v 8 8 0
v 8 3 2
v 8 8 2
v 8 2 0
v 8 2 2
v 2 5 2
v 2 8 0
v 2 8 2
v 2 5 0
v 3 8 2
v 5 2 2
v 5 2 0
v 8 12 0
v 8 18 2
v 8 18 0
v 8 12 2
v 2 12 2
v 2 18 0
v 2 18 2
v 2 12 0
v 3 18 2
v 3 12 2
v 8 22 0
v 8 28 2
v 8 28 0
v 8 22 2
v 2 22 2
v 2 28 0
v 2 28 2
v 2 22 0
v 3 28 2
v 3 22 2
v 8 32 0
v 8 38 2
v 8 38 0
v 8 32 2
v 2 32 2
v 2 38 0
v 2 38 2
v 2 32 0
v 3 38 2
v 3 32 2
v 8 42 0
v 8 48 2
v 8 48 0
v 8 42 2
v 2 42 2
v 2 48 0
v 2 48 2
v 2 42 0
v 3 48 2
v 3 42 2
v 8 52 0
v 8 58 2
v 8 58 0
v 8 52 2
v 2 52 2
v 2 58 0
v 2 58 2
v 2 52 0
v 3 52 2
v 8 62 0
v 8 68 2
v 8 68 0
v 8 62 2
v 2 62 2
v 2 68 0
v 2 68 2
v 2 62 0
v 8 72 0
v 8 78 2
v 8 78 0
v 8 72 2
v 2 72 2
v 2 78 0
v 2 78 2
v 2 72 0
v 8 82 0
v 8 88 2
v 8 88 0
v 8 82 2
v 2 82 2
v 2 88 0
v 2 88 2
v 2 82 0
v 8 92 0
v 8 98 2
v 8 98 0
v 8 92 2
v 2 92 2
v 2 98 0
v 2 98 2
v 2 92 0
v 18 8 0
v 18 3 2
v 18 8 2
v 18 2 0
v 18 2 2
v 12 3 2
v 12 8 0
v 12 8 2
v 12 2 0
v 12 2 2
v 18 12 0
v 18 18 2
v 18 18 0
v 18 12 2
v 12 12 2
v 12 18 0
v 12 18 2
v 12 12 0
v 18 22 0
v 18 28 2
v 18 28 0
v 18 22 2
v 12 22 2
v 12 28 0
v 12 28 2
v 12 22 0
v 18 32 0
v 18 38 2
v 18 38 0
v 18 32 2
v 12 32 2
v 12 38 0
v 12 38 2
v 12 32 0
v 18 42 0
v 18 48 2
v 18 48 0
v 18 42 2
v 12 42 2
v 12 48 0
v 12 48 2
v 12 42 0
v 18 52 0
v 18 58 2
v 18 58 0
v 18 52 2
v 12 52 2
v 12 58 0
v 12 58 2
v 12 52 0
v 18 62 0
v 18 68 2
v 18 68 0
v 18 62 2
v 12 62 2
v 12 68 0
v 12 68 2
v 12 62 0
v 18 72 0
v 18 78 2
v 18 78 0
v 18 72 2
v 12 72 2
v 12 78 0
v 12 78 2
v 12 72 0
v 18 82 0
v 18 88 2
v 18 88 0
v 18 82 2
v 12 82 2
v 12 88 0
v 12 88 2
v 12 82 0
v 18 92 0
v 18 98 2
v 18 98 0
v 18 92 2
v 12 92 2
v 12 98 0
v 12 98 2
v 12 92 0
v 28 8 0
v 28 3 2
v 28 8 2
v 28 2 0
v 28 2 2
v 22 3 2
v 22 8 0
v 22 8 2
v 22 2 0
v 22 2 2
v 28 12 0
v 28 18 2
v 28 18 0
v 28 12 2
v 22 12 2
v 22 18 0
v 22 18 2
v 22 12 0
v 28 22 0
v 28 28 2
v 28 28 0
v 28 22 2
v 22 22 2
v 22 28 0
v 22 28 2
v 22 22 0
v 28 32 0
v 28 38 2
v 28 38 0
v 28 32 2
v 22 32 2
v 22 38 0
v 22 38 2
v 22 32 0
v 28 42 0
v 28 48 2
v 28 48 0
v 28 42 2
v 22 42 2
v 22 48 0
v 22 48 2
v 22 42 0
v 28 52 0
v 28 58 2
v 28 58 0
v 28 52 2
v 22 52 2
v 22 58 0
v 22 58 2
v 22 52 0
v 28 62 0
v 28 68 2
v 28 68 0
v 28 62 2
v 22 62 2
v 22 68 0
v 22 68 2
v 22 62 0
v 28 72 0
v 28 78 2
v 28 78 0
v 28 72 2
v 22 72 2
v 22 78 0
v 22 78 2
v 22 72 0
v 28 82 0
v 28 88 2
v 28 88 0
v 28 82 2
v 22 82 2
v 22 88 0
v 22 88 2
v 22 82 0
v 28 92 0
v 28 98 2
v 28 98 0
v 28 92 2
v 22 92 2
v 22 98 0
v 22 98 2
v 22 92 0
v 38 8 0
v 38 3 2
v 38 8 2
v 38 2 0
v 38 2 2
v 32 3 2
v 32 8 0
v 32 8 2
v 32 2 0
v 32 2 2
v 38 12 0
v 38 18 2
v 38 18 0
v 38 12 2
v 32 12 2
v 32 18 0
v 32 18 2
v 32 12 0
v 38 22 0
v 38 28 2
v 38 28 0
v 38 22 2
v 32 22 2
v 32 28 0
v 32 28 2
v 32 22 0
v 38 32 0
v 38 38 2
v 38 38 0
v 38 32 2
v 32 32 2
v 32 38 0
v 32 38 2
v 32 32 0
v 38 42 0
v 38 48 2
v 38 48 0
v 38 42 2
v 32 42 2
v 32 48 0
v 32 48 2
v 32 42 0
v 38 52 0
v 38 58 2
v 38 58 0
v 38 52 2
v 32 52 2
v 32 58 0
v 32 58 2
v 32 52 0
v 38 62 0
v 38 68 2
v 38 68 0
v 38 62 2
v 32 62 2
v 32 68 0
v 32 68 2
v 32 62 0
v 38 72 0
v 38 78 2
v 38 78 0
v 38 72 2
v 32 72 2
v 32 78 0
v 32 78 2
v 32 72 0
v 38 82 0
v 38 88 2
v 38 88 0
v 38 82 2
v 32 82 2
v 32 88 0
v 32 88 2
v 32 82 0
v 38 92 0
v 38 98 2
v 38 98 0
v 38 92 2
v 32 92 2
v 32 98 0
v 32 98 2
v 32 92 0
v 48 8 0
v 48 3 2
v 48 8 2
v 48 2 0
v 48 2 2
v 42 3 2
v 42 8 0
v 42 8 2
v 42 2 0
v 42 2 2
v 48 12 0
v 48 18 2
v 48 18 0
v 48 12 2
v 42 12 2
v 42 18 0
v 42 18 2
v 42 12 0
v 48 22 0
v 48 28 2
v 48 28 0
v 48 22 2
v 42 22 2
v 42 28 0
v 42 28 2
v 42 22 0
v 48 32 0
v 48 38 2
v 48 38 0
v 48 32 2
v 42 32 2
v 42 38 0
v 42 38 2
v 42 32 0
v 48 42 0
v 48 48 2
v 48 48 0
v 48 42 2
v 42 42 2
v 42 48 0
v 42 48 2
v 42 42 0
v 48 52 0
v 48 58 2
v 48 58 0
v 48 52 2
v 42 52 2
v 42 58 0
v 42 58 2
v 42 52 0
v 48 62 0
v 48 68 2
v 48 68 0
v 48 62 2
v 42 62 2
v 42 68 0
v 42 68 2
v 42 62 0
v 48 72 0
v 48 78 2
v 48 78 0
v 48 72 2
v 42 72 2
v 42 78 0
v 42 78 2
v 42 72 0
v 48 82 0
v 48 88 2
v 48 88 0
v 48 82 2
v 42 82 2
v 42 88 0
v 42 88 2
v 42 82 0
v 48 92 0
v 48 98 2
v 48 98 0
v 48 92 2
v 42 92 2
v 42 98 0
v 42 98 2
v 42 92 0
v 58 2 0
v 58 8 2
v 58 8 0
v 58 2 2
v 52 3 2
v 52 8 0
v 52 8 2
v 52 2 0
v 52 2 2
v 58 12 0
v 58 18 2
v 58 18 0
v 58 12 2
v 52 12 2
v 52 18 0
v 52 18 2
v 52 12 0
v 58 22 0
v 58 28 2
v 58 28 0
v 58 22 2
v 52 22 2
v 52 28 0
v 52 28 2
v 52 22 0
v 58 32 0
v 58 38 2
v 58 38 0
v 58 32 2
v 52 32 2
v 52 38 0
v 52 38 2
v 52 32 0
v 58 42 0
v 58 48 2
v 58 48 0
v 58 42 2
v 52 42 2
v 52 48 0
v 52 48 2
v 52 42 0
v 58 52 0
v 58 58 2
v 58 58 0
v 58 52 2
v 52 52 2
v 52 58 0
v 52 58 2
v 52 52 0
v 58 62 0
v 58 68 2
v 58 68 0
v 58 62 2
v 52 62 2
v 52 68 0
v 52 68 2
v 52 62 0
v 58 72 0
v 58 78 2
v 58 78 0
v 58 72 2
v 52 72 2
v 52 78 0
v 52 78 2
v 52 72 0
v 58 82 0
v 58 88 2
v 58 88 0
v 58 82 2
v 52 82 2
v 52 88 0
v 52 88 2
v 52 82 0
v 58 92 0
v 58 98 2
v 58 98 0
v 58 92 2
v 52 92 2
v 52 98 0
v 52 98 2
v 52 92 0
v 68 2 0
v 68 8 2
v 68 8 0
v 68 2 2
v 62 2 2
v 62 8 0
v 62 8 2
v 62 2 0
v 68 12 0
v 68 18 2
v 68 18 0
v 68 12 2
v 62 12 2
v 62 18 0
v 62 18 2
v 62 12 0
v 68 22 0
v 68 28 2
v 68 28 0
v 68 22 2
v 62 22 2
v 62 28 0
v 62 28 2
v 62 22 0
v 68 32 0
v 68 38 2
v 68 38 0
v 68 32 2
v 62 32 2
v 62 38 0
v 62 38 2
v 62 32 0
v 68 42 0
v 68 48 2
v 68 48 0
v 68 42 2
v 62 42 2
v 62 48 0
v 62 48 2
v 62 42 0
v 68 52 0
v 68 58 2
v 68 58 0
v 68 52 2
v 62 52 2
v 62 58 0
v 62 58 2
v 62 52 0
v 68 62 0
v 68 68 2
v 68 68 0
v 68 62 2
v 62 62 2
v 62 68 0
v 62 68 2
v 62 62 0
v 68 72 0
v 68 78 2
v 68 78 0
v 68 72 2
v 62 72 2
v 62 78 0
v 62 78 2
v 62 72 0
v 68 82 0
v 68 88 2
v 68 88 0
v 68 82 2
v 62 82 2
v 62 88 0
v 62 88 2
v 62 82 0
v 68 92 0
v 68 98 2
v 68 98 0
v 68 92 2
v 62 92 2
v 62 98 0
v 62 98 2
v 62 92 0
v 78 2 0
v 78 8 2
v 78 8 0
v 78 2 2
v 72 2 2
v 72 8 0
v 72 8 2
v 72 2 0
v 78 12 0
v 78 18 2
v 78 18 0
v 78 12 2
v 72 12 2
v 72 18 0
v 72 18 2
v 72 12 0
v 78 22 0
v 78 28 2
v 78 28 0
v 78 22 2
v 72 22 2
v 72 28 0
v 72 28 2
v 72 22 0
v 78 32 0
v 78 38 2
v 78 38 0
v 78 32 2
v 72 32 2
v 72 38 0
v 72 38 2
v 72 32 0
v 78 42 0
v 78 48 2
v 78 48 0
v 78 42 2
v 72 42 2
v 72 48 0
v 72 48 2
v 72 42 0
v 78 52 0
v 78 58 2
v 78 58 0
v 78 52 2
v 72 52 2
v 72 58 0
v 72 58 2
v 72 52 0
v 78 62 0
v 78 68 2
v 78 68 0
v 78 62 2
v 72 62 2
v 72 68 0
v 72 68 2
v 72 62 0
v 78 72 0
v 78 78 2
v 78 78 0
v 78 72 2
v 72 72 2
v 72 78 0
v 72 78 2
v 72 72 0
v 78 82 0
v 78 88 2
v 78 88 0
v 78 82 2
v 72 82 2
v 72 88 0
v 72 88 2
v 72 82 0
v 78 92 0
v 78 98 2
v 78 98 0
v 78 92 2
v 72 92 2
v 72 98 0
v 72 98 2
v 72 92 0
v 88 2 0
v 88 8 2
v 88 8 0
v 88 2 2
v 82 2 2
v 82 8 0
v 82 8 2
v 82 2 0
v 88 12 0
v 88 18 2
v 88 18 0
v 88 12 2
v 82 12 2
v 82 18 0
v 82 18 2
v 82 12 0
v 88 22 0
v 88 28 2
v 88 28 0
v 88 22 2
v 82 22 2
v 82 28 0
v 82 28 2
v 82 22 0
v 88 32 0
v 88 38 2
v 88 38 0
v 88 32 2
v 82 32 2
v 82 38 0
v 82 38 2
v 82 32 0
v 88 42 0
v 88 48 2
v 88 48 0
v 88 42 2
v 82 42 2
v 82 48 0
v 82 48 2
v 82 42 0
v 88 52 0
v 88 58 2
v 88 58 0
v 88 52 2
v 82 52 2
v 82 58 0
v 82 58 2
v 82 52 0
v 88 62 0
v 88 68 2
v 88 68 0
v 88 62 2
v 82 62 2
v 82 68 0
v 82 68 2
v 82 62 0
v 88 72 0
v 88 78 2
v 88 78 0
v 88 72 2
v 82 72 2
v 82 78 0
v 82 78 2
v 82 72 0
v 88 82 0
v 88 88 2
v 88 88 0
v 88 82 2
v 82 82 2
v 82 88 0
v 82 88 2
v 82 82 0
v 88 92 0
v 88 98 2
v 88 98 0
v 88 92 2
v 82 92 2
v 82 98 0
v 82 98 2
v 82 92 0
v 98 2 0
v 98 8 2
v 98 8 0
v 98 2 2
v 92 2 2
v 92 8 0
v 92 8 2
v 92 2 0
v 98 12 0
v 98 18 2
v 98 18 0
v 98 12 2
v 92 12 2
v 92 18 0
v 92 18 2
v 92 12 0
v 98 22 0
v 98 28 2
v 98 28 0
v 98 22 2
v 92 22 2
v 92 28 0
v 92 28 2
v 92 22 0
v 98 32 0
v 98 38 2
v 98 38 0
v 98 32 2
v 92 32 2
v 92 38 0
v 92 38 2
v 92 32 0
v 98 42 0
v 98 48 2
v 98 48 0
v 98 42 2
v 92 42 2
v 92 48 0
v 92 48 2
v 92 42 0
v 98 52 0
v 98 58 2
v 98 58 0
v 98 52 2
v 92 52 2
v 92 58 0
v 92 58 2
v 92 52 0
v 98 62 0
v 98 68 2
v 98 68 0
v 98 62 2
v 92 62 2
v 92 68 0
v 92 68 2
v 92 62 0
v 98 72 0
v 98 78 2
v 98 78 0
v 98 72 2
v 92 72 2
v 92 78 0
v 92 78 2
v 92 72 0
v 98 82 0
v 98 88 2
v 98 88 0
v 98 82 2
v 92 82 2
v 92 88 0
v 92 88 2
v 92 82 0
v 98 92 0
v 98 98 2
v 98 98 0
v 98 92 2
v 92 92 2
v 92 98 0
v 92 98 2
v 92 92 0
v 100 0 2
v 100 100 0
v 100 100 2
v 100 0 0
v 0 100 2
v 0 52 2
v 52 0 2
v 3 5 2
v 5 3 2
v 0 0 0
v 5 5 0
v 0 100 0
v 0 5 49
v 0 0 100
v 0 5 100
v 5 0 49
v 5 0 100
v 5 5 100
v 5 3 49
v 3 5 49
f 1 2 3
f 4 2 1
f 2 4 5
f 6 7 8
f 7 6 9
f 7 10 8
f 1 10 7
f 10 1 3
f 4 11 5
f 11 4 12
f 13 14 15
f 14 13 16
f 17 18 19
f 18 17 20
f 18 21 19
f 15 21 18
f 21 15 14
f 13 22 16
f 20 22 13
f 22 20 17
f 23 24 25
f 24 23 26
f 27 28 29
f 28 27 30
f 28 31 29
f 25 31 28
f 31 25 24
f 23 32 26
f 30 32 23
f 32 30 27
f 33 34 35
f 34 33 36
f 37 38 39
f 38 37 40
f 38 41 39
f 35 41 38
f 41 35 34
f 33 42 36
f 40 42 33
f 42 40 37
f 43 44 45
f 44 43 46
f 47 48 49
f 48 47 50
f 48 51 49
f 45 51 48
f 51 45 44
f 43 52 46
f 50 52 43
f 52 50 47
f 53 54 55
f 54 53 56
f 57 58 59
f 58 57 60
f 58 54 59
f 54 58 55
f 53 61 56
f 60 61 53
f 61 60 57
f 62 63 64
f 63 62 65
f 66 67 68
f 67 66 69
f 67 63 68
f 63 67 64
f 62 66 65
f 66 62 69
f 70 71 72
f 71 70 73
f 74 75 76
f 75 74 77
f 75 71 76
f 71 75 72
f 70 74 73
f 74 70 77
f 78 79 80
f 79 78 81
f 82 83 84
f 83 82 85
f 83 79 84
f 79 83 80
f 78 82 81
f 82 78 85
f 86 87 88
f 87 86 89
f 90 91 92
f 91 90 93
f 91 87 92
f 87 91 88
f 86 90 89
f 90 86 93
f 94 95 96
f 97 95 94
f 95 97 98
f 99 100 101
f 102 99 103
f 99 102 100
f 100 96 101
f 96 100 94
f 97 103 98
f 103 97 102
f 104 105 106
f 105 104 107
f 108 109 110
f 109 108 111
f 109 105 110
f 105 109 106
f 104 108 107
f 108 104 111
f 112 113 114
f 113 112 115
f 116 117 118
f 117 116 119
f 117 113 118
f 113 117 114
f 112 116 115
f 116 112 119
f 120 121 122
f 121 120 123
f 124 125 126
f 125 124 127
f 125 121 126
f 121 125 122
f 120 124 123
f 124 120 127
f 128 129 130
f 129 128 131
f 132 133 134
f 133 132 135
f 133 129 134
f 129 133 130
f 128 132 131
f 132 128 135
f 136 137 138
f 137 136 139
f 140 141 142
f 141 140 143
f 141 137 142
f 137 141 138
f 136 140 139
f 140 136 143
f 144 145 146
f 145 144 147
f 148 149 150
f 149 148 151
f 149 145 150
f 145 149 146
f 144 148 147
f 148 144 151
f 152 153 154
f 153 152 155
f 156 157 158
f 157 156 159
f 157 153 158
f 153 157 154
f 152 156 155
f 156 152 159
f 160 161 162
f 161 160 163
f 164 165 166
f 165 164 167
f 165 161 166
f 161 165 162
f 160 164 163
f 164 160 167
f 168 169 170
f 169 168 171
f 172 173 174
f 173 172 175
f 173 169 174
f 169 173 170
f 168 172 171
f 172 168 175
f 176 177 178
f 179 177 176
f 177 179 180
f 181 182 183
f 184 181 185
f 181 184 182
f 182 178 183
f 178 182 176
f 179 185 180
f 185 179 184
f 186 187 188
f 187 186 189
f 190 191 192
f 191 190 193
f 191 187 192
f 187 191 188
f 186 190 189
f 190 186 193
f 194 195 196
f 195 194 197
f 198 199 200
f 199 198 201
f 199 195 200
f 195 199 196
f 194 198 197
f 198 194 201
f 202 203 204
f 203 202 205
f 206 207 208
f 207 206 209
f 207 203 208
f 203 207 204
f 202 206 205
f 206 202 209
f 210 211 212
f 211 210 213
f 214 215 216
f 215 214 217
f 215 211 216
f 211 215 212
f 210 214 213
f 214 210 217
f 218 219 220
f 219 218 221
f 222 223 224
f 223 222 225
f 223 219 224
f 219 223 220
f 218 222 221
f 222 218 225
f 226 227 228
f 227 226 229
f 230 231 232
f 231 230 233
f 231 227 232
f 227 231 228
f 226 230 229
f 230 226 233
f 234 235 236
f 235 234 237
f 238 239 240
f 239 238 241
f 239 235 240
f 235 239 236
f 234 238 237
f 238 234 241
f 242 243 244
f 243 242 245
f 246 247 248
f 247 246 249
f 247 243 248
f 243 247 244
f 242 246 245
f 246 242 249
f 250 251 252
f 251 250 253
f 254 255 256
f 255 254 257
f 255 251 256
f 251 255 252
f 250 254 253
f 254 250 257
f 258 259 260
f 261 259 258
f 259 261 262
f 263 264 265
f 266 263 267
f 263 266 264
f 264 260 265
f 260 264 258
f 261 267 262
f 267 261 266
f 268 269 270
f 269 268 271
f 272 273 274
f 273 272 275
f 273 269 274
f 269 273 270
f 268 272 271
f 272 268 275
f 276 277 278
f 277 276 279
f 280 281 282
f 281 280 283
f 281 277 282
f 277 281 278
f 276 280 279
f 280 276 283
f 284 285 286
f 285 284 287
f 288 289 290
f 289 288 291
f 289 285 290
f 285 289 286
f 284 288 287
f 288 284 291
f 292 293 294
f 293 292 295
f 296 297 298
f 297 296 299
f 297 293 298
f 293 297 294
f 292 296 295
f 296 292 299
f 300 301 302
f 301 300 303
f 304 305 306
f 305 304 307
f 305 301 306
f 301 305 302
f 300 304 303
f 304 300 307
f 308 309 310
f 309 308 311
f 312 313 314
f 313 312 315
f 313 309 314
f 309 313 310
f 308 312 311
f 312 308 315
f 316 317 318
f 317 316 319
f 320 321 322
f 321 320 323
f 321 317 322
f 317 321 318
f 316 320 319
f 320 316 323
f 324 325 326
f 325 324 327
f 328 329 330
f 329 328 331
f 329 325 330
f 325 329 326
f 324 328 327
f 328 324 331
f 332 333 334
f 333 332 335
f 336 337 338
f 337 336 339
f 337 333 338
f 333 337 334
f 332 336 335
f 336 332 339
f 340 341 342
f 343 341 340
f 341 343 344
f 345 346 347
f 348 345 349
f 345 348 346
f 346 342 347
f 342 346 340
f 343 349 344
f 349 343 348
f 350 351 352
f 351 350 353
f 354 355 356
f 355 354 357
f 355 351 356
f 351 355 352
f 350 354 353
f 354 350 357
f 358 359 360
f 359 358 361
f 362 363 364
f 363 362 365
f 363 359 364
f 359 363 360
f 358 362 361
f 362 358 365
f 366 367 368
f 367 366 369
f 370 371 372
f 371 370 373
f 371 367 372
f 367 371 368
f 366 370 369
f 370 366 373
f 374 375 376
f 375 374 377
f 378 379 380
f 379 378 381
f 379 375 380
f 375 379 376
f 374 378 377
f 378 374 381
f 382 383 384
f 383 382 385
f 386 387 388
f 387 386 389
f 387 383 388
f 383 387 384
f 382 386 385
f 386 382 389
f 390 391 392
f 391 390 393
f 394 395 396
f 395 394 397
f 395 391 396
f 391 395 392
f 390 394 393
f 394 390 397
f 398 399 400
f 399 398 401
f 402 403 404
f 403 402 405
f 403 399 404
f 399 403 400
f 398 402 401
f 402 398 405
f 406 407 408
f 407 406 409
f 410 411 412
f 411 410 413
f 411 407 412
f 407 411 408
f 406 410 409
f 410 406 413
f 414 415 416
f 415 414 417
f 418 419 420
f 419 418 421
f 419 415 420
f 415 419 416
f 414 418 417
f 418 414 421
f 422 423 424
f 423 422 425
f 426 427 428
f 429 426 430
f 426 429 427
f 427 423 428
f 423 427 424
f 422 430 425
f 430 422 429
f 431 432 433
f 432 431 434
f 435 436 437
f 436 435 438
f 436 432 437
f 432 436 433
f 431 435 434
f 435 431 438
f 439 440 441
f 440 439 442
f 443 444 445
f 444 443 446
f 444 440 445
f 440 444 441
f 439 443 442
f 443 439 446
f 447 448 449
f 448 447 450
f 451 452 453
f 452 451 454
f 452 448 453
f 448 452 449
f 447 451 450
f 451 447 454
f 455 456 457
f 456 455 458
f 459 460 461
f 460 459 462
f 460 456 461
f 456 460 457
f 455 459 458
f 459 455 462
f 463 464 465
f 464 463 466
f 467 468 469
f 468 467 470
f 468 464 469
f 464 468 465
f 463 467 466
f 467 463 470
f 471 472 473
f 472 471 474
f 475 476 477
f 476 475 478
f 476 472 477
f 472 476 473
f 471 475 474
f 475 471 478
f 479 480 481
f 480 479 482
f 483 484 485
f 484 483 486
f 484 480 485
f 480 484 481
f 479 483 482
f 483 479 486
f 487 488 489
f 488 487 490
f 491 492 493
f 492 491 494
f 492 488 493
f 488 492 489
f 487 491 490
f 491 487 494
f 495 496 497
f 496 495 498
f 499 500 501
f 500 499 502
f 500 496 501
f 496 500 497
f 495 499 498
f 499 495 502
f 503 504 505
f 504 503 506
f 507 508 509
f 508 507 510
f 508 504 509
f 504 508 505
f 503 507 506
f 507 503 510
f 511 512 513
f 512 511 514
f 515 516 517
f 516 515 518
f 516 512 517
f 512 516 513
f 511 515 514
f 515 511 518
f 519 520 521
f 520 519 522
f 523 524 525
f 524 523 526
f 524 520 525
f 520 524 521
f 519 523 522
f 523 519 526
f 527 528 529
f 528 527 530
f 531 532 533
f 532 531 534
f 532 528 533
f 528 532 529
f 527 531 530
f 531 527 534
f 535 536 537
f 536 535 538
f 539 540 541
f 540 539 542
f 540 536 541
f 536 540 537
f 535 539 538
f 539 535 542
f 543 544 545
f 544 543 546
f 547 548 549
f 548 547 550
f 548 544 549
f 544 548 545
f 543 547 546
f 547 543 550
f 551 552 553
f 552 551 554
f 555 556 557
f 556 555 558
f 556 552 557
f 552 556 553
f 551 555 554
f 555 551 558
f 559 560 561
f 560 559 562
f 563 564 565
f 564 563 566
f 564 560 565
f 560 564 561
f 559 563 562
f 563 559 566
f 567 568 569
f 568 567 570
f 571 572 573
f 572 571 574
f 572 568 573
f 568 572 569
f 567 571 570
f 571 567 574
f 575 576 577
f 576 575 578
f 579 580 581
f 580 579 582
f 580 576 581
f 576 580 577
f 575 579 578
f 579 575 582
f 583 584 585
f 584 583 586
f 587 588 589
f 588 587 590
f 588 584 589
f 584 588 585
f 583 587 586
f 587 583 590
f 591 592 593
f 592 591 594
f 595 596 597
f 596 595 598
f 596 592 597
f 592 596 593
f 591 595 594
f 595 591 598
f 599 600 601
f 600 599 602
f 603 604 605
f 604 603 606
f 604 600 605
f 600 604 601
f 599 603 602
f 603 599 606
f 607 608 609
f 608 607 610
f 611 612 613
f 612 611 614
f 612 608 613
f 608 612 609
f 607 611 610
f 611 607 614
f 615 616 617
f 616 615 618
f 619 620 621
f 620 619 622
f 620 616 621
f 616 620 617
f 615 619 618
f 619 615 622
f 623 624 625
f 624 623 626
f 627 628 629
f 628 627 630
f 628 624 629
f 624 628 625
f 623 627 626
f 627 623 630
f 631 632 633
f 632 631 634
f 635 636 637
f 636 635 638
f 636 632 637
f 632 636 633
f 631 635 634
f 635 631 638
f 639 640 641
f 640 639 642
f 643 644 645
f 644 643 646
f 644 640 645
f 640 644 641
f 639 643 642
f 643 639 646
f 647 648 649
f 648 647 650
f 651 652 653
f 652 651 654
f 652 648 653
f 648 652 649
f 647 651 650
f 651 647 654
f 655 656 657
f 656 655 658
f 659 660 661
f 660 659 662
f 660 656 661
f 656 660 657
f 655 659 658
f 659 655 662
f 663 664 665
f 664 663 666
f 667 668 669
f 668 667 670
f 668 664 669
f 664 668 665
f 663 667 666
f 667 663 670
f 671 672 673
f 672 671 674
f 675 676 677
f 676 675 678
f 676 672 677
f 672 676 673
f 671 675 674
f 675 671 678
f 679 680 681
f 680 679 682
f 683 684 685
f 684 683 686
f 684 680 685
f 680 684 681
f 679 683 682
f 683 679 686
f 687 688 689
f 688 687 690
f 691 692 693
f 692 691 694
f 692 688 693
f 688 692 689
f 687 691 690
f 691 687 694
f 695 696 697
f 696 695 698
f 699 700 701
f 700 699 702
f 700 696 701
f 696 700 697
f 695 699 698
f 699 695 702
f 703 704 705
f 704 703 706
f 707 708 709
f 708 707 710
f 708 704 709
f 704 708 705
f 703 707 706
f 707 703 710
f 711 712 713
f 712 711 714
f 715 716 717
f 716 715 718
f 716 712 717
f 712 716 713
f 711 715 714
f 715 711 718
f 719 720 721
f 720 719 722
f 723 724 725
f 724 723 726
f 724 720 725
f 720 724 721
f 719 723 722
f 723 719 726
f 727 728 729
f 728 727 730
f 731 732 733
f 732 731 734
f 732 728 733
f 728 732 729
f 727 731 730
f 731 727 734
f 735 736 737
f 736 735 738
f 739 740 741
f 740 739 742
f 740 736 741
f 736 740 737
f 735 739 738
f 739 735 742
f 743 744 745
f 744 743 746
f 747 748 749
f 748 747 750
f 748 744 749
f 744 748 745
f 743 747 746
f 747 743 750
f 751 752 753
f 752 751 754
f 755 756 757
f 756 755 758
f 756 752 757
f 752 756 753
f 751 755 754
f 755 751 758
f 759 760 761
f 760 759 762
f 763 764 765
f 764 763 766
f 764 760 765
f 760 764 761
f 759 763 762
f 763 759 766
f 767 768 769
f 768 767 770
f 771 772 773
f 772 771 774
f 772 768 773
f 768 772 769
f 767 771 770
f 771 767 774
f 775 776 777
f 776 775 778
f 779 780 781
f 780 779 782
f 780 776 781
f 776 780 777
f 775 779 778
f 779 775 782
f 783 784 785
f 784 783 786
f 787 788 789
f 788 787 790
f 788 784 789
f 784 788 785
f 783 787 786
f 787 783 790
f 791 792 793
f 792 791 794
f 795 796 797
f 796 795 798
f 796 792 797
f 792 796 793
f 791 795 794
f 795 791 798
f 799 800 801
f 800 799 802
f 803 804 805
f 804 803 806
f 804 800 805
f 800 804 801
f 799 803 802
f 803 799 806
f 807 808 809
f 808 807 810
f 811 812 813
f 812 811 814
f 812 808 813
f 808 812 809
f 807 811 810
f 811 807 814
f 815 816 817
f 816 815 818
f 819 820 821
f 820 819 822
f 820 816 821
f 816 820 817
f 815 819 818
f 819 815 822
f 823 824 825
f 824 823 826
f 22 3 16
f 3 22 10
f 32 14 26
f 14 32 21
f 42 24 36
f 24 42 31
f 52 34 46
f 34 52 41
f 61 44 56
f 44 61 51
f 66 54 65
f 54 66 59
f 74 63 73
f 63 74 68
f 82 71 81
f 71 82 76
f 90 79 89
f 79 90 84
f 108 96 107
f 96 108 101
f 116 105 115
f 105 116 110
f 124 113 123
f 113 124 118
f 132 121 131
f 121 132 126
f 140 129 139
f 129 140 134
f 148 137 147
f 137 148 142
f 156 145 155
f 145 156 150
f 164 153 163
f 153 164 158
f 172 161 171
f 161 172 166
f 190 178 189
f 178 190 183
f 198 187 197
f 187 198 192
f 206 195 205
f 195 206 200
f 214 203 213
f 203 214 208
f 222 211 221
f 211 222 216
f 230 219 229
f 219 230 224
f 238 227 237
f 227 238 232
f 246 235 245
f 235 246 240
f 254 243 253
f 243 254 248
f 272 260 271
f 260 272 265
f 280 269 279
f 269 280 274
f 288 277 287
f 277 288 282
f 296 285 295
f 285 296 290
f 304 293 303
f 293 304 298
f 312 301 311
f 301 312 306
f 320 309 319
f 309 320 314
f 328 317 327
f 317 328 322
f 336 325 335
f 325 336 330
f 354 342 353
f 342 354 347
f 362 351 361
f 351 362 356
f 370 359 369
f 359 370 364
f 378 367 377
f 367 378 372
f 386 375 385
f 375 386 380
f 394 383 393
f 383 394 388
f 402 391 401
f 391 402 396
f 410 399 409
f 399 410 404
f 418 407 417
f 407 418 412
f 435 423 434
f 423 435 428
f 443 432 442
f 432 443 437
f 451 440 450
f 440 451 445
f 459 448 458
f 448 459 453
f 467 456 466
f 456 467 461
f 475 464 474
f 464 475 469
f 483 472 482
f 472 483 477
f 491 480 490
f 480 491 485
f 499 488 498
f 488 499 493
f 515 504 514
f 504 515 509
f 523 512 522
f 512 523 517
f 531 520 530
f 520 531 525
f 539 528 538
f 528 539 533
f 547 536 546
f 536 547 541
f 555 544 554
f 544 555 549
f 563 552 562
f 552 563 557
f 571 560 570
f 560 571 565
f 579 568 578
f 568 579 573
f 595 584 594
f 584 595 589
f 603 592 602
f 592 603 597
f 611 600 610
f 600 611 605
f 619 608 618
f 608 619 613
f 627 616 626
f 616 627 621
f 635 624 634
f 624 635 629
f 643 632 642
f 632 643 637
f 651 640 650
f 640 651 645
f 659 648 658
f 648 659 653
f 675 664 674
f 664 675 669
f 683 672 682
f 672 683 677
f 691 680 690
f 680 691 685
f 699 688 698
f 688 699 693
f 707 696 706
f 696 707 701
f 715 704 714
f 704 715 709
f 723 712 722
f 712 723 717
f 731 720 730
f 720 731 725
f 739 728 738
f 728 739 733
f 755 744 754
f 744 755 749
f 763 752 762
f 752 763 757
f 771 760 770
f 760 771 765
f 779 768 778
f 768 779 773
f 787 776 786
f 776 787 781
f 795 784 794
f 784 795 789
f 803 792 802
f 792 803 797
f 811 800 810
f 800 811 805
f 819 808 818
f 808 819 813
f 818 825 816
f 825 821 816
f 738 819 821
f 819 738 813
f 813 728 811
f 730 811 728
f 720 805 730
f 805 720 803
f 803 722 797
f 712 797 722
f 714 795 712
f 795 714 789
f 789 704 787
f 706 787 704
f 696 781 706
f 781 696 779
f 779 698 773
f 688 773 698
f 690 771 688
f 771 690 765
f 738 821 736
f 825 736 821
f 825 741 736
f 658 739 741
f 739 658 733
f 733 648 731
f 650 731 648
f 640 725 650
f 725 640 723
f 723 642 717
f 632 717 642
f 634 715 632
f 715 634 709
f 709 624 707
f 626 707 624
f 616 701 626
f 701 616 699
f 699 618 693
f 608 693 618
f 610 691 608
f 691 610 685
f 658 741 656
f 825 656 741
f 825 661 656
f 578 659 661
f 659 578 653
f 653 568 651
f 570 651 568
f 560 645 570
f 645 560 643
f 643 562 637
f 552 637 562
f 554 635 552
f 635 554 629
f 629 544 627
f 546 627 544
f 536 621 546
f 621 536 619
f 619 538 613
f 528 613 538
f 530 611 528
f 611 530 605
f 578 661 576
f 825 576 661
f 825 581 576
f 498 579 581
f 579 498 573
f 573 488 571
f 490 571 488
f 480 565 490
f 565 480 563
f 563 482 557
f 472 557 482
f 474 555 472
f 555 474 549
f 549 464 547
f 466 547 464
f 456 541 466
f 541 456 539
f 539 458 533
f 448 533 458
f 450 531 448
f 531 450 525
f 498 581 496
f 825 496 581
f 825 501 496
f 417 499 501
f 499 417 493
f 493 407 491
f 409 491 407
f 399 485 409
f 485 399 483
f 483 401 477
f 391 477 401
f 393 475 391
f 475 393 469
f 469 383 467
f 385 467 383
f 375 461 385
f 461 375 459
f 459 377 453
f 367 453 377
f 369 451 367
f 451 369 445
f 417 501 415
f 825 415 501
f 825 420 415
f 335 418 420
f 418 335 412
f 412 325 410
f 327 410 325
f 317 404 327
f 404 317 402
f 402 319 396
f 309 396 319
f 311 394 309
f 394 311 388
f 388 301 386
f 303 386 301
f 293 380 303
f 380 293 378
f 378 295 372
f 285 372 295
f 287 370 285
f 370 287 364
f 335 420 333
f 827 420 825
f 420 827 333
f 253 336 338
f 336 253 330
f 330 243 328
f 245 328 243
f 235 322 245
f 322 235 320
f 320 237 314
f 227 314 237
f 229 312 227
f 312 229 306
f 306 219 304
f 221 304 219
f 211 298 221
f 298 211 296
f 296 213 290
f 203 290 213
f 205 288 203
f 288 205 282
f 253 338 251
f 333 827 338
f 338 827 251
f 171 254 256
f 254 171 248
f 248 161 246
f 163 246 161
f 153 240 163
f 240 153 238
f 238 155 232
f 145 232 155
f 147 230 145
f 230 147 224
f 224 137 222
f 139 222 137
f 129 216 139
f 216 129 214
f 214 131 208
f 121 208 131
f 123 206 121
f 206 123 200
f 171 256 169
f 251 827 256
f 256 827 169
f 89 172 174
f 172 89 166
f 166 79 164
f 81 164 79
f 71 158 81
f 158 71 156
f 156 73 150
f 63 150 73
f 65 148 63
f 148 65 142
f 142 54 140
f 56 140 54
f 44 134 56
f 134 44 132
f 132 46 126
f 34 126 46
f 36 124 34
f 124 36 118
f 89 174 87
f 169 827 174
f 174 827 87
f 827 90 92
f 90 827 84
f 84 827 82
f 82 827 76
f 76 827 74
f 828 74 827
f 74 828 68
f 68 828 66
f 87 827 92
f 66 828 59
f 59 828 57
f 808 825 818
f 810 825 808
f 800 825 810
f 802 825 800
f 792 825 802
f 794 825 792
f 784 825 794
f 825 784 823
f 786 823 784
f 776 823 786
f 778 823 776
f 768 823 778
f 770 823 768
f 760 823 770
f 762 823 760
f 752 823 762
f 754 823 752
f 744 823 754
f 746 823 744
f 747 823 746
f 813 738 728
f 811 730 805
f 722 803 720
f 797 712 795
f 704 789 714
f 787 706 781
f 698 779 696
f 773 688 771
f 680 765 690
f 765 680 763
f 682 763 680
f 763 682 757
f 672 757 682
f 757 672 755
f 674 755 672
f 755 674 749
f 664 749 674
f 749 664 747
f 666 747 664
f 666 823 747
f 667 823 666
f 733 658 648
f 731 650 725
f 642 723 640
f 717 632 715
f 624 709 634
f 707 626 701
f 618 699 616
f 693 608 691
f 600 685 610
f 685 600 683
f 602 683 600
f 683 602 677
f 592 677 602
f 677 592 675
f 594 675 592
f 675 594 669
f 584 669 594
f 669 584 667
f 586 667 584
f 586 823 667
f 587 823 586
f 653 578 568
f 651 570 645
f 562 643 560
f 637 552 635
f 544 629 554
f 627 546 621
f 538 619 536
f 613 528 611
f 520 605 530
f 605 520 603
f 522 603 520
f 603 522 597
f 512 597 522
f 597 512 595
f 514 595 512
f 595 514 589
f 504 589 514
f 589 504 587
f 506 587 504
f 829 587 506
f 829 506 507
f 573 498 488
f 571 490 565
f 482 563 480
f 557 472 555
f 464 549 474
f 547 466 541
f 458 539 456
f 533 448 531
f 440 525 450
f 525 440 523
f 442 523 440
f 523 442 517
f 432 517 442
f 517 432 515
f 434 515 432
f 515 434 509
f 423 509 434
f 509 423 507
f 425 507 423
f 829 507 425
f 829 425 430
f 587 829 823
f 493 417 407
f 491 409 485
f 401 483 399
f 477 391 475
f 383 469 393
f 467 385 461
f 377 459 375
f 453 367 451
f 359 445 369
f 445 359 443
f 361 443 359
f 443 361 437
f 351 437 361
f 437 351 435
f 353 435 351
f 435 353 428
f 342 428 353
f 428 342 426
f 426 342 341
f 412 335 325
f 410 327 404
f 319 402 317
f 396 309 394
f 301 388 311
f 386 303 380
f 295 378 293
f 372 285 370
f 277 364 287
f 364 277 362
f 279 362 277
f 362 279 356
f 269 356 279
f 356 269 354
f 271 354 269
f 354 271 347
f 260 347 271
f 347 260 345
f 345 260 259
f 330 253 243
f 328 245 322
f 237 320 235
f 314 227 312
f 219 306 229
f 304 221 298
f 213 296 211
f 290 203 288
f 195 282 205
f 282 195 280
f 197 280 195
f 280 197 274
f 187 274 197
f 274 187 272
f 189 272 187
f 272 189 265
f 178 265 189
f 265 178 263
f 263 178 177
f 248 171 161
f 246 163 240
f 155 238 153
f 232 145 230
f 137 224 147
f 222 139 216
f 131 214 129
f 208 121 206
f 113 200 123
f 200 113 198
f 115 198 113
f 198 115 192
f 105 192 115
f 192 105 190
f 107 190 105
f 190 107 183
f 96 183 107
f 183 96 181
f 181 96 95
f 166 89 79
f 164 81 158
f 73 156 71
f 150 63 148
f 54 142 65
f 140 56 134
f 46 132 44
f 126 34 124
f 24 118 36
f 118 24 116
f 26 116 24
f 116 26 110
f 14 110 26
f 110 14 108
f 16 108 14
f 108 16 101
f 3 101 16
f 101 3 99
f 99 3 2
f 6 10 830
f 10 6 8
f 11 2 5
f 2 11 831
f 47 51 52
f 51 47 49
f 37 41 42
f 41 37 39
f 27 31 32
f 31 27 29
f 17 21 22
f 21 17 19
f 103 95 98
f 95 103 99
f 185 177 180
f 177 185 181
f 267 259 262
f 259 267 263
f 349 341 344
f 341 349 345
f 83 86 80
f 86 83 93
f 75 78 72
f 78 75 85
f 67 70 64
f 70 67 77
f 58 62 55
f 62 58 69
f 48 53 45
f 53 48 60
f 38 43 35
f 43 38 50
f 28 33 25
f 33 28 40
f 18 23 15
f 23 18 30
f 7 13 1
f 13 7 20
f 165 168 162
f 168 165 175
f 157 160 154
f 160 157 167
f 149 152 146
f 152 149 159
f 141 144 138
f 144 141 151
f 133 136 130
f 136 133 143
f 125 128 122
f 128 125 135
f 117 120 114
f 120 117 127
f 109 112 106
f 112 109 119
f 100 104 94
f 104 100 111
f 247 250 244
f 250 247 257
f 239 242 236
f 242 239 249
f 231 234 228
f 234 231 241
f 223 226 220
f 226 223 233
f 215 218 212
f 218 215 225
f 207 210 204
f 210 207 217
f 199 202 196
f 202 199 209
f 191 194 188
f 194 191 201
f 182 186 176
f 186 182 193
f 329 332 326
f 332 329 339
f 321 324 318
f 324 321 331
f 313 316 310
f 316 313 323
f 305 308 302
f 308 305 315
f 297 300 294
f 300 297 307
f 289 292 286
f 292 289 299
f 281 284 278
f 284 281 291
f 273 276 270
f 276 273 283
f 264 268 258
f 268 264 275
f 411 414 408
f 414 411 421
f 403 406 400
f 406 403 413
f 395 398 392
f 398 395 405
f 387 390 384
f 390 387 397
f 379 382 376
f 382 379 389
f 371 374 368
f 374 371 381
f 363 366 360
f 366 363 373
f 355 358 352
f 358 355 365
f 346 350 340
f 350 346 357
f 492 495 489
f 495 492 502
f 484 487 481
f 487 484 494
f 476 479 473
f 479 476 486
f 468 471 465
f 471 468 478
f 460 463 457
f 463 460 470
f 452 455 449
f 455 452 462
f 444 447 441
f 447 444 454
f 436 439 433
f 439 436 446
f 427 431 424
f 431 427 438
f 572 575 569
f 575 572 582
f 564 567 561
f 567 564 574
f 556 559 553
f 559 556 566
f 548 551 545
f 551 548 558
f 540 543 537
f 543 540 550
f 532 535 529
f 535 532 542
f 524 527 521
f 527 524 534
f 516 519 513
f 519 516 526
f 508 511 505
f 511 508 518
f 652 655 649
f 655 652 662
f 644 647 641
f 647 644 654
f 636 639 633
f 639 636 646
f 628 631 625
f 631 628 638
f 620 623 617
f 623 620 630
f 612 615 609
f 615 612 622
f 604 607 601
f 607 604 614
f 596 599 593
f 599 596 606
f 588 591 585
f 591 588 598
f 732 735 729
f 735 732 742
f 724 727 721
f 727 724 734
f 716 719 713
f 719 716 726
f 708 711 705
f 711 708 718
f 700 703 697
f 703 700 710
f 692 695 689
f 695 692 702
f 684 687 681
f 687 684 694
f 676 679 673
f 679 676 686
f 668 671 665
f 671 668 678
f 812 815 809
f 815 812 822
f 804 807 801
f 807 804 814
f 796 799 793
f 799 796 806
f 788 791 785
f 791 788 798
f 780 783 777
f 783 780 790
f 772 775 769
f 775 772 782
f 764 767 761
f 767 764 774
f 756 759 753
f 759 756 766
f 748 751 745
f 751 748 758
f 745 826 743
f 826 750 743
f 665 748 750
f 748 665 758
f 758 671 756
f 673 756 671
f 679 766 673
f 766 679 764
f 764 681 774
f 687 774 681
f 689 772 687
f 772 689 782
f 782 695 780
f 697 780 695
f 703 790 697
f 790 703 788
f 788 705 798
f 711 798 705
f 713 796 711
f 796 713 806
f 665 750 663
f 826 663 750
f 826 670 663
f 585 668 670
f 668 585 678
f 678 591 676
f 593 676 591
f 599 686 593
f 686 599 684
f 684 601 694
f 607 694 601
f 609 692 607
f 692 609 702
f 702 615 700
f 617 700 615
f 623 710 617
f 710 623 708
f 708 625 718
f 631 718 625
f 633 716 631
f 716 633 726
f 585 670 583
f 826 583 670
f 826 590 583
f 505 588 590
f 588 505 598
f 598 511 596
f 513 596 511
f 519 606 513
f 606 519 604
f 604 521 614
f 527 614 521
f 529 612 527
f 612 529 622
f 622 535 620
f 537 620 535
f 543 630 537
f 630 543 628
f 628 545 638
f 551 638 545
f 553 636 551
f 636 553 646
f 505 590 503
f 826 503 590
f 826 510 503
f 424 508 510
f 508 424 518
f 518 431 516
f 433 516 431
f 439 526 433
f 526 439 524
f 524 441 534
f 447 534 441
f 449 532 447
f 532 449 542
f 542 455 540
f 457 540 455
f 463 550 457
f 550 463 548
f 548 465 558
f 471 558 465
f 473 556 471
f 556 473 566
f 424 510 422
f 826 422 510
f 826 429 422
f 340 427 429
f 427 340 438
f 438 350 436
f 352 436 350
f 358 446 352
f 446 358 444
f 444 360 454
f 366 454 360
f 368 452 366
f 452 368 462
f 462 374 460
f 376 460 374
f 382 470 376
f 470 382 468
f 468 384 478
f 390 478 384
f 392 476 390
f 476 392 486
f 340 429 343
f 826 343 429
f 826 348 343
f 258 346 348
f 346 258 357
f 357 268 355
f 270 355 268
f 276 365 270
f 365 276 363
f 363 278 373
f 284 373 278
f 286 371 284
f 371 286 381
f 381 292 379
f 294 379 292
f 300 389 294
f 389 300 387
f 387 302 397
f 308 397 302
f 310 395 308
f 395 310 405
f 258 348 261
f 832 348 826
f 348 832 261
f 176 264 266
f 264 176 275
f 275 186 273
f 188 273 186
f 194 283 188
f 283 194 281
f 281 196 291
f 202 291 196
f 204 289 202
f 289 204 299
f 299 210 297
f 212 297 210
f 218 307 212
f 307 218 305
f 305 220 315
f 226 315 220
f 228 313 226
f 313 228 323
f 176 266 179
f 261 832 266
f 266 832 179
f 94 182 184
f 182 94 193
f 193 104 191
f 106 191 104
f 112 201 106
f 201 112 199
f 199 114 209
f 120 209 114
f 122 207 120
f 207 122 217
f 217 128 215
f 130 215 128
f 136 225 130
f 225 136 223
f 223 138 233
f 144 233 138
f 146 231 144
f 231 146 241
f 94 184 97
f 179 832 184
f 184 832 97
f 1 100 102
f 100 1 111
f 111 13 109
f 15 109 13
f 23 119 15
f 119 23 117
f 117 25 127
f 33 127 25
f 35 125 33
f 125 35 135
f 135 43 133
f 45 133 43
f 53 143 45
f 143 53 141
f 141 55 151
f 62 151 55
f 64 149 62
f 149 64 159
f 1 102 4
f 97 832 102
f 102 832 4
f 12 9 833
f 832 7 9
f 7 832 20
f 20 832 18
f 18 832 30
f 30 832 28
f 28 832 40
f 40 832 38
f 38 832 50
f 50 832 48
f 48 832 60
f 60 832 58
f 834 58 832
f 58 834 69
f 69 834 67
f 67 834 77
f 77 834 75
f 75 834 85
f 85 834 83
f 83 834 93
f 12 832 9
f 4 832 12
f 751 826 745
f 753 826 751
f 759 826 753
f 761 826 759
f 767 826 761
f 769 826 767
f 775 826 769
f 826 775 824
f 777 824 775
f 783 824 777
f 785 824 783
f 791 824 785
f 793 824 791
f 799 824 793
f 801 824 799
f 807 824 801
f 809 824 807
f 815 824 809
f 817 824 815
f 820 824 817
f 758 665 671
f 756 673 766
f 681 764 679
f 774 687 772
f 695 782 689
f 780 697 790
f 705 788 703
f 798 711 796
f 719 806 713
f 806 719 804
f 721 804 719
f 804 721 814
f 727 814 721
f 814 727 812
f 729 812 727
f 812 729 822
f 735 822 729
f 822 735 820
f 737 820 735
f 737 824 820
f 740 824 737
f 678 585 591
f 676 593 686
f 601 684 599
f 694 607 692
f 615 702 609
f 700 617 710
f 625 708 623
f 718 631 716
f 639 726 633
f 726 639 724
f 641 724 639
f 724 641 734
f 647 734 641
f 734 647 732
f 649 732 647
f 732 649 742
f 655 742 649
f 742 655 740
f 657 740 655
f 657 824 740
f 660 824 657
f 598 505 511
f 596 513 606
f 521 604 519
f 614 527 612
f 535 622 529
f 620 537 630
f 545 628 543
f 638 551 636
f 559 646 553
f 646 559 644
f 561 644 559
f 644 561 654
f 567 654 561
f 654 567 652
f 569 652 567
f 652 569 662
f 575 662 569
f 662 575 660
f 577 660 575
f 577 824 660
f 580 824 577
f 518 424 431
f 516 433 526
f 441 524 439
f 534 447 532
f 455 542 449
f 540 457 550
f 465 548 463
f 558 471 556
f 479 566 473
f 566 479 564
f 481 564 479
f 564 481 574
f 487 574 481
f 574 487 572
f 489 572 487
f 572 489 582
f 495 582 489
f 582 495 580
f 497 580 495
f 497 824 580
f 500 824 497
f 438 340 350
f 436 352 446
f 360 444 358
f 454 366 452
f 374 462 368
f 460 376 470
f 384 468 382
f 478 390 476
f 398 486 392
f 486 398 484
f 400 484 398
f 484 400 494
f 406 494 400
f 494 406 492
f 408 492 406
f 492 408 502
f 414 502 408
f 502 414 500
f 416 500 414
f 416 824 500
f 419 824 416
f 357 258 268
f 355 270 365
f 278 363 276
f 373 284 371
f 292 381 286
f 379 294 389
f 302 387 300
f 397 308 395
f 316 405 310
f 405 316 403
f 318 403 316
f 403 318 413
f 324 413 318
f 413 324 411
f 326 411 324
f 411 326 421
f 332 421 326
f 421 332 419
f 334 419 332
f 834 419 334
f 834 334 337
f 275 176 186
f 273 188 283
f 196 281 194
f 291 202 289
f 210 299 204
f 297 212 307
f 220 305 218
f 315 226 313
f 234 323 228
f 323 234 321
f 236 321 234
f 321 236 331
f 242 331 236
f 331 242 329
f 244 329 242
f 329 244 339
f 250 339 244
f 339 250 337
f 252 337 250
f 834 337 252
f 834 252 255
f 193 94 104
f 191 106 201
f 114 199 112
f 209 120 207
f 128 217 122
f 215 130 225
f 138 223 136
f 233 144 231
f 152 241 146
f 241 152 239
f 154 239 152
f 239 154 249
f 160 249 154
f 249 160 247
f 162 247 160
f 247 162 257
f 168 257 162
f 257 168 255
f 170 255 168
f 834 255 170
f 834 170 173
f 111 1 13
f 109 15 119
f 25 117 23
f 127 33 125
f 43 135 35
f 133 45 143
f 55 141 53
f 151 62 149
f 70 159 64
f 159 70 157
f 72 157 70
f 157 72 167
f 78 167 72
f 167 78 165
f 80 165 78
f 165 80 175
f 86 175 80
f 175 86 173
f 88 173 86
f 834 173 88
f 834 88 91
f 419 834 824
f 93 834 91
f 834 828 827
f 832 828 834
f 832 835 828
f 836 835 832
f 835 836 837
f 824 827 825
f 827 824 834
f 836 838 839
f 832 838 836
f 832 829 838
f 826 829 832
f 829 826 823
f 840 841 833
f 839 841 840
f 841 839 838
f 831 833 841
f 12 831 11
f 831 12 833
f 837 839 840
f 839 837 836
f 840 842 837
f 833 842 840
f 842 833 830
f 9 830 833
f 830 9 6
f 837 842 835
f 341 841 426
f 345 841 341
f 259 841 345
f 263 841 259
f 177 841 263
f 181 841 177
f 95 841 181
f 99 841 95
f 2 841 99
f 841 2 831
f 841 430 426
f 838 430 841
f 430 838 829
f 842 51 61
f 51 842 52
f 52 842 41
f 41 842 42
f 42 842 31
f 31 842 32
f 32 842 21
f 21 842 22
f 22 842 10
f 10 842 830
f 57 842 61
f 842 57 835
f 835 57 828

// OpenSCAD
difference() {
  cube([100,100,2]);
  for (i=[2:10:92]) {
    for (j=[2:10:92]) {
      translate([i,j,-1]) cube([6,6,4]);
    }
  }
}
cube([5,5,100]);
translate([2,3,2]) rotate([90,0,0]) linear_extrude(height=3) polygon(points=[[0,0],[50,0],[0,50]]);
translate([0,2,2]) rotate([90,0,90]) linear_extrude(height=3) polygon(points=[[0,0],[50,0],[0,50]]);
